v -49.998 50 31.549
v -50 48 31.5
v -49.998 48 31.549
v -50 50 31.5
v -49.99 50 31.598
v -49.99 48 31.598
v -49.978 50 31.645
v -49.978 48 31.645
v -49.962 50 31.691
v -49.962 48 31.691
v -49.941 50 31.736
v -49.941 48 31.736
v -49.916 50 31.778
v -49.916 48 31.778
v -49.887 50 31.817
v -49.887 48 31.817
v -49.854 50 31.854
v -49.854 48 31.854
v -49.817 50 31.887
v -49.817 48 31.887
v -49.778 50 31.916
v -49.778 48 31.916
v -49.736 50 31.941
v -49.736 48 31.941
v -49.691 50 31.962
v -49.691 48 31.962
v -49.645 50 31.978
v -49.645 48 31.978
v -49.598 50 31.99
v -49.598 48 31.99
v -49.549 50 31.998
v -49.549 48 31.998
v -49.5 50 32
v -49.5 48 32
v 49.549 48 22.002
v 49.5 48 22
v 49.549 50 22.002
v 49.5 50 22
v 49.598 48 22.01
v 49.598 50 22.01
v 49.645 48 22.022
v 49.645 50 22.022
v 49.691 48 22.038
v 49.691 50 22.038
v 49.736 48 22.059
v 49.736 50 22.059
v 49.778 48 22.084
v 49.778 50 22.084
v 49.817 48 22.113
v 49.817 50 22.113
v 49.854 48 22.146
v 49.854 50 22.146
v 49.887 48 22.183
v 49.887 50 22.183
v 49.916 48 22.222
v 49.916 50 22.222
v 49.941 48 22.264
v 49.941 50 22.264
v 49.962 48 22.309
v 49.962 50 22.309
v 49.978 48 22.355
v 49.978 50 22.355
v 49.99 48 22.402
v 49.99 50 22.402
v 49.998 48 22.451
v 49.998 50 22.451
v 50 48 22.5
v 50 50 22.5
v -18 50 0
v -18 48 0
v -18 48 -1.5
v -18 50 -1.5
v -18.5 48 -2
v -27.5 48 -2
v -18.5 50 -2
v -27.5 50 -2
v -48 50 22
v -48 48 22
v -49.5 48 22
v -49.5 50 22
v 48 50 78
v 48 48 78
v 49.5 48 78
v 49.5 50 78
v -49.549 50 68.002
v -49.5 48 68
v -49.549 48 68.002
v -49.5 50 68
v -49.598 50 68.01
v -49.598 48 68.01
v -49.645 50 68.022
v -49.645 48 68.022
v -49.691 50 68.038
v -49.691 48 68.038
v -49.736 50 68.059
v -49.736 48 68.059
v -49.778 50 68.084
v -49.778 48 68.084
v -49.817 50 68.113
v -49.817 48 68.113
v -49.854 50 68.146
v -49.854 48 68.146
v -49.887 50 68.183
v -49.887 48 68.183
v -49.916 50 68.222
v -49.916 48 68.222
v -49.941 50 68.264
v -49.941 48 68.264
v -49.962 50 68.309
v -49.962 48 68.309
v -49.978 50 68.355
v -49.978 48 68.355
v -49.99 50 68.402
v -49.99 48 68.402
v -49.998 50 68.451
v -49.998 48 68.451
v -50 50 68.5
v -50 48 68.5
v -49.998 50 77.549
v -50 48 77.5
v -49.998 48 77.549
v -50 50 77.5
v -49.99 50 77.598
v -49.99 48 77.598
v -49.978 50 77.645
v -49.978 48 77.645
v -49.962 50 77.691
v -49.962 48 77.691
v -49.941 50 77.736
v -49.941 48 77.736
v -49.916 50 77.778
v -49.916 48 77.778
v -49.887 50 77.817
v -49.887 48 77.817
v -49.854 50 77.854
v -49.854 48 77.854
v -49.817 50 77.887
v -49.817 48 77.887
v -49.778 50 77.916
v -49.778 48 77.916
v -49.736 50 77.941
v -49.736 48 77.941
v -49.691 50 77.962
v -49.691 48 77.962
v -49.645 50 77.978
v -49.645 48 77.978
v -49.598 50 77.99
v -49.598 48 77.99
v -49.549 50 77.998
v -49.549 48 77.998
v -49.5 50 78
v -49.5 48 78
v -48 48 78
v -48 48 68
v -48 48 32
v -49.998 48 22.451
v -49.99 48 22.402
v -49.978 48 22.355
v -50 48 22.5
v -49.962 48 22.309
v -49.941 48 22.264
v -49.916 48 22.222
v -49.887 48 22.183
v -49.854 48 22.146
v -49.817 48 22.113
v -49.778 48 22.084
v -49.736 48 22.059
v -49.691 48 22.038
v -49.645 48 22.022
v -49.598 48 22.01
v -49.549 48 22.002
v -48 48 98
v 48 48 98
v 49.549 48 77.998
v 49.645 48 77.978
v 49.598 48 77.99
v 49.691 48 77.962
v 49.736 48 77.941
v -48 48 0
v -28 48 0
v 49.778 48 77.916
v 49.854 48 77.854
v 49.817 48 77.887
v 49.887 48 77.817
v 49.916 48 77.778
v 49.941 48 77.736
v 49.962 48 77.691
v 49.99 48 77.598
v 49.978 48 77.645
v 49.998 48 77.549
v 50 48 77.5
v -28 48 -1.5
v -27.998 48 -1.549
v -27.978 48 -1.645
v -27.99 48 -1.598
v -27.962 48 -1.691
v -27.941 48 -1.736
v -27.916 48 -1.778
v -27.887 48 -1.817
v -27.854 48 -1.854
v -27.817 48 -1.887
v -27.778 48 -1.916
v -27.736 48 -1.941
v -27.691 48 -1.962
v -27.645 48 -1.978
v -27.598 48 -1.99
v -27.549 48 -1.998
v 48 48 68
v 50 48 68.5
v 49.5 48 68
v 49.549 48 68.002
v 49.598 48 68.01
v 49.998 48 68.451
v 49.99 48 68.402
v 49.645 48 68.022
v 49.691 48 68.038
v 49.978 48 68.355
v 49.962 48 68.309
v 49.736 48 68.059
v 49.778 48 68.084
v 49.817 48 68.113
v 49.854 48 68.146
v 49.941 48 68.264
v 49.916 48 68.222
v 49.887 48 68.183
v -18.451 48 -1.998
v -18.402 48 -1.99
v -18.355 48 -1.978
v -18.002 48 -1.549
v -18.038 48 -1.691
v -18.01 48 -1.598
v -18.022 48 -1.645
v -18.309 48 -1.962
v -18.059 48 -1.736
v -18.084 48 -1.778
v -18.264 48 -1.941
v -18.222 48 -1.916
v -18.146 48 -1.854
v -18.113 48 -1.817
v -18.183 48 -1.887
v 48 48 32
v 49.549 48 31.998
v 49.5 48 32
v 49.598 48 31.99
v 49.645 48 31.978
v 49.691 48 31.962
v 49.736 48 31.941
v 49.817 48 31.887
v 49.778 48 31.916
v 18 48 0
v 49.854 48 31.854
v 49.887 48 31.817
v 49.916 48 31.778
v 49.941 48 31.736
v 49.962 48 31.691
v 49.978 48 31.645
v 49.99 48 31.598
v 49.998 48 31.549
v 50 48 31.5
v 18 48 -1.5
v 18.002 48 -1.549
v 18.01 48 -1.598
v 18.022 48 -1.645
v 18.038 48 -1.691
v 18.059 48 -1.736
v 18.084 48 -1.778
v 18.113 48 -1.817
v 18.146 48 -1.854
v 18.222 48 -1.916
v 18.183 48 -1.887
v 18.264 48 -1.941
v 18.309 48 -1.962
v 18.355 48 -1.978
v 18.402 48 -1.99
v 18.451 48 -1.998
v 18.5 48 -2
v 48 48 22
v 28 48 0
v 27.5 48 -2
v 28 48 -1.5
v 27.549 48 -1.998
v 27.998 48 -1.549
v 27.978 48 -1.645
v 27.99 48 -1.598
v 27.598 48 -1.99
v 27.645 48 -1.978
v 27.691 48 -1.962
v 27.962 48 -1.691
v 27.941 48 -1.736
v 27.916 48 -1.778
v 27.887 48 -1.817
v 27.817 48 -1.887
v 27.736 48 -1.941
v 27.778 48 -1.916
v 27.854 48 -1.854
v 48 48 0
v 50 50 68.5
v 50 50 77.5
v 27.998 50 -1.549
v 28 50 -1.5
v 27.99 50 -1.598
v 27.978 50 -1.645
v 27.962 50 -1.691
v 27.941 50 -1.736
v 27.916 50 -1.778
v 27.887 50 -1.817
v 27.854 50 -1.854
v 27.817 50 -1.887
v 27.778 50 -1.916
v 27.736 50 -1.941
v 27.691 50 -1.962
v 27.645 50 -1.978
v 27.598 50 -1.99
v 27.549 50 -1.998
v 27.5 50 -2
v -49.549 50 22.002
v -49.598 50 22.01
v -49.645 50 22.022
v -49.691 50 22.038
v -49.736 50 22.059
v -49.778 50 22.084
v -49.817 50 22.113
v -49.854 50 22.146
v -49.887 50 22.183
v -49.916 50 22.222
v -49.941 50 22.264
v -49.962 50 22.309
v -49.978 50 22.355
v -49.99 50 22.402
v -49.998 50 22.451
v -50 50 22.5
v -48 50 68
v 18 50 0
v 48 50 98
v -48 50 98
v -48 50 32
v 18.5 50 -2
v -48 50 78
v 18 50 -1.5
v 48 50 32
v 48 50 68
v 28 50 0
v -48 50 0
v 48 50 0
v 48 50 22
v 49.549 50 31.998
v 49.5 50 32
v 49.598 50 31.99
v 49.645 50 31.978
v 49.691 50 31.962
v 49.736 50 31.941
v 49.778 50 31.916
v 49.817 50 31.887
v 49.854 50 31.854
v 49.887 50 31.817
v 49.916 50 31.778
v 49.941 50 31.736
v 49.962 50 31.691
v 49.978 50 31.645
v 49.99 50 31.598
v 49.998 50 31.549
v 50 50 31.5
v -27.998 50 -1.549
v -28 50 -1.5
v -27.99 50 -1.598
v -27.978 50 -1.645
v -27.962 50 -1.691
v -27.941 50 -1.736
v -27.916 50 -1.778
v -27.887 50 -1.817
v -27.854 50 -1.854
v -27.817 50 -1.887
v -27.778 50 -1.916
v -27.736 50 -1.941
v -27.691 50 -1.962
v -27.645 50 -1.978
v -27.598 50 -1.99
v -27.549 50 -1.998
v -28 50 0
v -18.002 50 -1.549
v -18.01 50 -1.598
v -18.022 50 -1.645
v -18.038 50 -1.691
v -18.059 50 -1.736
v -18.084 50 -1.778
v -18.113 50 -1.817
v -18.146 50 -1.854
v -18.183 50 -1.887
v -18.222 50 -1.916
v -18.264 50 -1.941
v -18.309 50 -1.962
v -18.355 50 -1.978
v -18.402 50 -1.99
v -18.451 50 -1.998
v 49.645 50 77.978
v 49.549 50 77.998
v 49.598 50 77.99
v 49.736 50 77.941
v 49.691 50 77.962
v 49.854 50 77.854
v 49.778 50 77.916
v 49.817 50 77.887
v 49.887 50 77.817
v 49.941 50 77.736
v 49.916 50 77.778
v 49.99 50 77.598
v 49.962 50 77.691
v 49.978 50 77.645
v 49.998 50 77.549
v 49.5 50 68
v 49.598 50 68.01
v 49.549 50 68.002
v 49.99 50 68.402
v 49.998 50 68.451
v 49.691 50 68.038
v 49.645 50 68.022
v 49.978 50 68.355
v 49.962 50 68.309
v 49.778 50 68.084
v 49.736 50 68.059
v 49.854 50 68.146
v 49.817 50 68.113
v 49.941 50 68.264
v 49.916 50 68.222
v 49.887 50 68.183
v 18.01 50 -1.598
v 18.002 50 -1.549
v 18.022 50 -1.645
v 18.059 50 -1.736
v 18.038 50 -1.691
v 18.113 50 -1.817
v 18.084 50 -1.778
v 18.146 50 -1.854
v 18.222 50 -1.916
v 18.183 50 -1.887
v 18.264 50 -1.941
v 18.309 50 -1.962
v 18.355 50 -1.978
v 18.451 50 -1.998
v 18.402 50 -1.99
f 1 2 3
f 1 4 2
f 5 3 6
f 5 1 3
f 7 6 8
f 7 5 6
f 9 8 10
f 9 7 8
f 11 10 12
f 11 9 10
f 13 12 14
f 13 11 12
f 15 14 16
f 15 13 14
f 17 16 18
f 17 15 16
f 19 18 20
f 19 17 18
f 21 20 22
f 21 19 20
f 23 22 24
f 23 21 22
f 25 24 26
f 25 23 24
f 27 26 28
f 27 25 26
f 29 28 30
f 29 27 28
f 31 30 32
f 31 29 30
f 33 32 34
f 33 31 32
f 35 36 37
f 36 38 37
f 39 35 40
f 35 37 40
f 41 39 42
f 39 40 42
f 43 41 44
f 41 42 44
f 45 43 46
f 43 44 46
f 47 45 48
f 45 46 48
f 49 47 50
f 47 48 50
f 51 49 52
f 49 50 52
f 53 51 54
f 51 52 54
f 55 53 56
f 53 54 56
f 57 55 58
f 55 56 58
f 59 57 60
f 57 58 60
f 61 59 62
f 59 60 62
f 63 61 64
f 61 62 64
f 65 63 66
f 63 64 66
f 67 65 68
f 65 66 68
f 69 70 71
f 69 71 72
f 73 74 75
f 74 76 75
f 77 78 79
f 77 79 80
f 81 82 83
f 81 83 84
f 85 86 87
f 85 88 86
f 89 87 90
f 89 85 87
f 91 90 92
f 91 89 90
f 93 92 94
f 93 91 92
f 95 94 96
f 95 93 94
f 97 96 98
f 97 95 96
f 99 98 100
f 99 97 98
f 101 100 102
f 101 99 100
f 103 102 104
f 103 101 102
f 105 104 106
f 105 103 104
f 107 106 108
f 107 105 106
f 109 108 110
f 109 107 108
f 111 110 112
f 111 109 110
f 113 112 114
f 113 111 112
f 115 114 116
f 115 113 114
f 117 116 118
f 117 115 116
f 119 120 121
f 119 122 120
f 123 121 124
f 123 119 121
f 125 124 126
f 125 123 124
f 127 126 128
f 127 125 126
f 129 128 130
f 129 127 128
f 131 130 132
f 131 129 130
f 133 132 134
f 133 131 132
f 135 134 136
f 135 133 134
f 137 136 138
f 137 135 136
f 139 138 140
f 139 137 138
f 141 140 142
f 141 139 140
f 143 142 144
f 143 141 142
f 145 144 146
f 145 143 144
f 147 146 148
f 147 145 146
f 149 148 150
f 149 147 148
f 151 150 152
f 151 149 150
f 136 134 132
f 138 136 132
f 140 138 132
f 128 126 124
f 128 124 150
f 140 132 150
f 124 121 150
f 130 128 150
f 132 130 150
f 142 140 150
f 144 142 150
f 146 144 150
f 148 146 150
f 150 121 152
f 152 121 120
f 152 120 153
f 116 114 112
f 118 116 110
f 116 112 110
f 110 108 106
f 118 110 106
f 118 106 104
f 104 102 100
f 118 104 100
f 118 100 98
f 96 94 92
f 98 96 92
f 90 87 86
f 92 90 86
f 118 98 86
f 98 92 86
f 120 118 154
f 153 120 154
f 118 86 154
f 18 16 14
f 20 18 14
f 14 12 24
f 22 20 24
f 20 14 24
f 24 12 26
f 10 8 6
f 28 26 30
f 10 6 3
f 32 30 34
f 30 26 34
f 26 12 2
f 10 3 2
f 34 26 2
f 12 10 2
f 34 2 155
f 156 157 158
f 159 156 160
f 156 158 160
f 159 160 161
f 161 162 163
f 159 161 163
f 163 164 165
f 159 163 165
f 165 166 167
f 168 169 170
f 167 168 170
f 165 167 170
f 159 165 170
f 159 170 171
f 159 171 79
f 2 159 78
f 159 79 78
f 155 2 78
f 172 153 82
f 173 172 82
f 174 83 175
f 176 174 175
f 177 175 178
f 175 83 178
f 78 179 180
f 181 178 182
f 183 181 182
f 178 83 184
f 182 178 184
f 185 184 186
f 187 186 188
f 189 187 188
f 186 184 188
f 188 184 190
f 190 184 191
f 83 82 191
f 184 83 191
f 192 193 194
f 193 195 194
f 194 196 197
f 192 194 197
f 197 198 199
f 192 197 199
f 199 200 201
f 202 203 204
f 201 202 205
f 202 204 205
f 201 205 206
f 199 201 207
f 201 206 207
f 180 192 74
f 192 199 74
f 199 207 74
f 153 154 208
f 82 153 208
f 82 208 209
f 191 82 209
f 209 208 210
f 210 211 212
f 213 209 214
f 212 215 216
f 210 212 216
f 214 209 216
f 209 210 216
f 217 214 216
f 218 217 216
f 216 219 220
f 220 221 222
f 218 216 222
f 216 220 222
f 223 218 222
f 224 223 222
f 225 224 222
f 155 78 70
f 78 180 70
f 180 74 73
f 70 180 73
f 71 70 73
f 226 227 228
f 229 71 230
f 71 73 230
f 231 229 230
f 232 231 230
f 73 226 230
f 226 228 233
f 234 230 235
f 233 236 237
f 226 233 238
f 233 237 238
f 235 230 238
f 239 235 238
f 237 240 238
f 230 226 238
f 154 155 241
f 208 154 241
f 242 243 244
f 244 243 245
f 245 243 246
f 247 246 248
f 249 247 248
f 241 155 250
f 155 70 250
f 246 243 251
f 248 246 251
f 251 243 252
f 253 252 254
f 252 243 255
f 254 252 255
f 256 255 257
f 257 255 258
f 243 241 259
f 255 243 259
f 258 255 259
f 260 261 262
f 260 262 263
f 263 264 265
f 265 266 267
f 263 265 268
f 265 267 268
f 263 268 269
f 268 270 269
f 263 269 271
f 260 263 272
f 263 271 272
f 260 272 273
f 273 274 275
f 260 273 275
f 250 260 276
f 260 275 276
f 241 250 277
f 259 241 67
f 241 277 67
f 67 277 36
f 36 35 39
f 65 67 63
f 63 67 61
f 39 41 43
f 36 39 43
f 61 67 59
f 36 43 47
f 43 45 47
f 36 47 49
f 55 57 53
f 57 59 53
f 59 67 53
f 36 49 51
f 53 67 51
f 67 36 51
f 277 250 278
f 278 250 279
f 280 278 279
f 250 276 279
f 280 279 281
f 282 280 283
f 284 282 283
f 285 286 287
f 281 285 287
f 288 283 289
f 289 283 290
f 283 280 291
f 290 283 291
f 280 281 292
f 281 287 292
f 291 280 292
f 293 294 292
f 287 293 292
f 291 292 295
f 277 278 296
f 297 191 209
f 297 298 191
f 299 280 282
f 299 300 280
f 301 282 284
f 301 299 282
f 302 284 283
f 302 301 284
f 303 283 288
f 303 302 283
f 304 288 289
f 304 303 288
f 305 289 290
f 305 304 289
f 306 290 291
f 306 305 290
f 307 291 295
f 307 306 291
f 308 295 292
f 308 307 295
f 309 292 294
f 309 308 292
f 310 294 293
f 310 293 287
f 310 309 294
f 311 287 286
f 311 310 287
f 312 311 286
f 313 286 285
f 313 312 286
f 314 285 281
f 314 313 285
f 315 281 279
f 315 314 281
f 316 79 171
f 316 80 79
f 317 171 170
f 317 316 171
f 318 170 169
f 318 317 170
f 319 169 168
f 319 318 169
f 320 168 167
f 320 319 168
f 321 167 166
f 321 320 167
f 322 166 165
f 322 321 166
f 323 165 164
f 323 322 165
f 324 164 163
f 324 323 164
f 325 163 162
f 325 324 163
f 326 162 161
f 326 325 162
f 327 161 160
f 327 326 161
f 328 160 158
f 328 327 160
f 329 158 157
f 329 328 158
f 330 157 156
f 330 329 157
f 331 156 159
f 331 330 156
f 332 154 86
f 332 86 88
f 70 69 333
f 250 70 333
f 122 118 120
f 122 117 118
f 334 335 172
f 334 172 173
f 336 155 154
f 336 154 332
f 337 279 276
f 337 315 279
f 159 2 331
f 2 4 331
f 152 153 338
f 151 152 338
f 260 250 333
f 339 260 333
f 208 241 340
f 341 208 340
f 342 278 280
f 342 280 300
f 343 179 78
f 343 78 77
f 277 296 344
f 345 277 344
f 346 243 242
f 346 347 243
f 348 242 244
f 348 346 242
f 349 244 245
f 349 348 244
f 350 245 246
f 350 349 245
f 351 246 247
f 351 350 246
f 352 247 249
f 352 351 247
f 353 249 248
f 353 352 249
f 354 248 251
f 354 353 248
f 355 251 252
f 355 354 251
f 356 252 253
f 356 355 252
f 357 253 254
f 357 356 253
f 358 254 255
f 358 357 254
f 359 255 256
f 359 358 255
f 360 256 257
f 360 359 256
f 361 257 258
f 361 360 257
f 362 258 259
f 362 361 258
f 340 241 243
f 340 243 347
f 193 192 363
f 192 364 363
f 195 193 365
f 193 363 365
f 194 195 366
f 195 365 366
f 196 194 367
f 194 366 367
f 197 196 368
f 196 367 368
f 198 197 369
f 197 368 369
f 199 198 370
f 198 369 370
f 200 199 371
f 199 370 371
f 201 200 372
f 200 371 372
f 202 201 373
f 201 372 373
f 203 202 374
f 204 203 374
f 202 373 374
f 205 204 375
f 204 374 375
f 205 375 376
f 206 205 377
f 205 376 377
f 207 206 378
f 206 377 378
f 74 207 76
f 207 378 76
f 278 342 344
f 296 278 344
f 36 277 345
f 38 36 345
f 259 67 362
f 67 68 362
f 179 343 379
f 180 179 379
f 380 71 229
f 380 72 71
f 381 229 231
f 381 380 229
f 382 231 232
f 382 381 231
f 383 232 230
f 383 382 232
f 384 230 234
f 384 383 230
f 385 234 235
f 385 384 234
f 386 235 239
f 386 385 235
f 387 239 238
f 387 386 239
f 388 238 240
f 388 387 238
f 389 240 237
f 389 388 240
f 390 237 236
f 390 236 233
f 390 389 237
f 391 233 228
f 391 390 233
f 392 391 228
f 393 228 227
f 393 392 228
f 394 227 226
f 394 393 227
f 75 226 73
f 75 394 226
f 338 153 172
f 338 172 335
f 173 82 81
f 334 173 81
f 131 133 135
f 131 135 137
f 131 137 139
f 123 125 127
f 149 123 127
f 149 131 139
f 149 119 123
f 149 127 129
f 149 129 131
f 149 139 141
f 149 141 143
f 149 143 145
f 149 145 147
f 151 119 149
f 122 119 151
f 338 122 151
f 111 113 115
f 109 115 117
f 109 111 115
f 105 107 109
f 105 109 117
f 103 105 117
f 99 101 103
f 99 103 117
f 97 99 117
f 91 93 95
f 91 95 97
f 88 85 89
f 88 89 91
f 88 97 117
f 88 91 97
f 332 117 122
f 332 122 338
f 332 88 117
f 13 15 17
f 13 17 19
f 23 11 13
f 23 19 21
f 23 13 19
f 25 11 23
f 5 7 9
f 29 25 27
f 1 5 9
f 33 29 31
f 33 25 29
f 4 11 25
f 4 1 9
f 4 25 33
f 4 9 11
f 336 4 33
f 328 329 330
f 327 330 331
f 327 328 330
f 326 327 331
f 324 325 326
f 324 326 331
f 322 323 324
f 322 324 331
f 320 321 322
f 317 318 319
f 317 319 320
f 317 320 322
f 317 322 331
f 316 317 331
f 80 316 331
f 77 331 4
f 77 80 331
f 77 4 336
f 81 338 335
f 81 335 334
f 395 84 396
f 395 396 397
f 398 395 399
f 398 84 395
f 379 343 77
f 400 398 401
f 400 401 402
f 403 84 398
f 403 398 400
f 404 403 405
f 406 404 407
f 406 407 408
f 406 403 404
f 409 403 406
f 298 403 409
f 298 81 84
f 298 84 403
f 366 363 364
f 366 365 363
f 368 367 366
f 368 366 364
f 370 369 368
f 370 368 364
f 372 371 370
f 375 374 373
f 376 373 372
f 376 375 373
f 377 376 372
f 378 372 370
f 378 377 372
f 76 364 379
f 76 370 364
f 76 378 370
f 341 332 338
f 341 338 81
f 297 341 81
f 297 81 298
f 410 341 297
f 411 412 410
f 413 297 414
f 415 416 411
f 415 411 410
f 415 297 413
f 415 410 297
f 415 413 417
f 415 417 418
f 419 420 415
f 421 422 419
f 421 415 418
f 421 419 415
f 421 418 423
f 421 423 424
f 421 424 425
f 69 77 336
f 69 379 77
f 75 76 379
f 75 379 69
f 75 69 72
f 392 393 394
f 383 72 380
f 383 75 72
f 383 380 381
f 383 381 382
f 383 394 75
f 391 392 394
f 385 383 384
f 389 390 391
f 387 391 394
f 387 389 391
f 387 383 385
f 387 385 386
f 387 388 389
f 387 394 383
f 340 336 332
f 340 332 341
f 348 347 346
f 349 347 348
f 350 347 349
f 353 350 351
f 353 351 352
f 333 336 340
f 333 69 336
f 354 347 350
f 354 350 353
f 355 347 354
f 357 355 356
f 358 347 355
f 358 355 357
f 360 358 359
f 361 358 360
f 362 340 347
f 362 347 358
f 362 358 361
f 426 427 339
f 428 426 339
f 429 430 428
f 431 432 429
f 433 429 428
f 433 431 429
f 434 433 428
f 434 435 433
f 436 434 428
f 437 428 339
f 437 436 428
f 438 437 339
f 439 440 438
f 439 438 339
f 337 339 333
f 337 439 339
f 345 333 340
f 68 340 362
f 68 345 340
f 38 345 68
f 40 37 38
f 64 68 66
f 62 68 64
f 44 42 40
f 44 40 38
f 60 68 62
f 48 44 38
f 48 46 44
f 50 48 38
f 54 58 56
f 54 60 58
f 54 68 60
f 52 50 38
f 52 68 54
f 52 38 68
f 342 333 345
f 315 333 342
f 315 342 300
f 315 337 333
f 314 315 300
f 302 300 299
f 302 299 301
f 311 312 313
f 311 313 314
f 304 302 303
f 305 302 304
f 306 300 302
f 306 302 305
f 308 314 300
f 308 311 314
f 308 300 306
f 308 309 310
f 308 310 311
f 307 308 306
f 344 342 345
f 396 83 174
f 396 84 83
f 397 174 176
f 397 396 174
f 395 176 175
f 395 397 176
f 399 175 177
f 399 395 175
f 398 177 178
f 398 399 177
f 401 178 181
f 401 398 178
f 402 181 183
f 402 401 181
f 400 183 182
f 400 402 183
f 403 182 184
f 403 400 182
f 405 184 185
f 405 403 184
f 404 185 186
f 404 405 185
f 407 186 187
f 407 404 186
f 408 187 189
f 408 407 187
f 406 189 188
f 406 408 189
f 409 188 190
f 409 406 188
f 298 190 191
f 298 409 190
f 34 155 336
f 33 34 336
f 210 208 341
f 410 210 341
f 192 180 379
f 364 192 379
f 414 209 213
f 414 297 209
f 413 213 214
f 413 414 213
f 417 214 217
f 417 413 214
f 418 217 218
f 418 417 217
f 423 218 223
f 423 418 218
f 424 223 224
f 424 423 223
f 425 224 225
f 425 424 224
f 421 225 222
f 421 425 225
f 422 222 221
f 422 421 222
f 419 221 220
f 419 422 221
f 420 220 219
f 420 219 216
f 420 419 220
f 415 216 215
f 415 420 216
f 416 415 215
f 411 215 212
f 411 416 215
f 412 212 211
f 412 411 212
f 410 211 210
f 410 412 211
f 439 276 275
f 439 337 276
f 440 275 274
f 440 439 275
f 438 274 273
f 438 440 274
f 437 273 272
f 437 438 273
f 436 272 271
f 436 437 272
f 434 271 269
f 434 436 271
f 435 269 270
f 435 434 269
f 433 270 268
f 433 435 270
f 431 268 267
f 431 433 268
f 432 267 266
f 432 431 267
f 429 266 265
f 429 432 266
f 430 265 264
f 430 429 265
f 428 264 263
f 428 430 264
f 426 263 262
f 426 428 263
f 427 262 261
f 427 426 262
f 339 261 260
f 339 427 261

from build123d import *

# Parameters (mm, degrees)
SKETCH1_W           = 96
SKETCH1_H           = 2
BOSS_EXTRUDE1_DEPTH = 98
SKETCH2_W           = 10
SKETCH2_H           = 2
BOSS_EXTRUDE2_DEPTH = 2
SKETCH3_W           = 10
SKETCH3_H           = 2
BOSS_EXTRUDE3_DEPTH = 2
SKETCH4_W           = 10
SKETCH4_H           = 2
BOSS_EXTRUDE4_DEPTH = 2
FILLET1_R           = 0.5


with BuildPart() as part:
    # Sketch1 → Boss-Extrude1 (new body)
    with BuildSketch(Plane.XY):
        with Locations((0, 49)):
            Rectangle(SKETCH1_W, SKETCH1_H)
    extrude(amount=BOSS_EXTRUDE1_DEPTH)

    # Sketch2 → Boss-Extrude2 (add)
    with BuildSketch(Plane(origin=(0, 0, 0), x_dir=(-1, 0, 0), z_dir=(0, 0, -1))):
        with Locations((-23, 49)):
            Rectangle(SKETCH2_W, SKETCH2_H)
    boss_extrude2 = extrude(amount=BOSS_EXTRUDE2_DEPTH)

    # Mirror1: Boss-Extrude2 across plane
    add(boss_extrude2.mirror(Plane(origin=(0, 0, 0), x_dir=(0, 0, 1), z_dir=(1, 0, 0))))

    # Sketch3 → Boss-Extrude3 (add)
    with BuildSketch(Plane.ZY.offset(48)):
        with Locations((73, 49)):
            Rectangle(SKETCH3_W, SKETCH3_H)
    boss_extrude3 = extrude(amount=BOSS_EXTRUDE3_DEPTH)

    # Mirror2: Boss-Extrude3 across plane
    add(boss_extrude3.mirror(Plane.XY.offset(50)))

    # Sketch4 → Boss-Extrude4 (add)
    with BuildSketch(Plane(origin=(48, 0, 0), x_dir=(0, 0, -1), z_dir=(1, 0, 0))):
        with Locations((-73, 49)):
            Rectangle(SKETCH4_W, SKETCH4_H)
    boss_extrude4 = extrude(amount=BOSS_EXTRUDE4_DEPTH)

    # Mirror3: Boss-Extrude4 across plane
    add(boss_extrude4.mirror(Plane.XY.offset(50)))

    # Fillet1
    fillet1_edges = [part.edges().sort_by_distance(p)[0] for p in [
        (18, 49, -2),
        (28, 49, -2),
        (-28, 49, -2),
        (-18, 49, -2),
        (-50, 49, 68),
        (-50, 49, 78),
        (-50, 49, 22),
        (-50, 49, 32),
        (50, 49, 78),
        (50, 49, 68),
        (50, 49, 32),
        (50, 49, 22),
    ]]
    fillet(fillet1_edges, radius=FILLET1_R)


solid = part.part
